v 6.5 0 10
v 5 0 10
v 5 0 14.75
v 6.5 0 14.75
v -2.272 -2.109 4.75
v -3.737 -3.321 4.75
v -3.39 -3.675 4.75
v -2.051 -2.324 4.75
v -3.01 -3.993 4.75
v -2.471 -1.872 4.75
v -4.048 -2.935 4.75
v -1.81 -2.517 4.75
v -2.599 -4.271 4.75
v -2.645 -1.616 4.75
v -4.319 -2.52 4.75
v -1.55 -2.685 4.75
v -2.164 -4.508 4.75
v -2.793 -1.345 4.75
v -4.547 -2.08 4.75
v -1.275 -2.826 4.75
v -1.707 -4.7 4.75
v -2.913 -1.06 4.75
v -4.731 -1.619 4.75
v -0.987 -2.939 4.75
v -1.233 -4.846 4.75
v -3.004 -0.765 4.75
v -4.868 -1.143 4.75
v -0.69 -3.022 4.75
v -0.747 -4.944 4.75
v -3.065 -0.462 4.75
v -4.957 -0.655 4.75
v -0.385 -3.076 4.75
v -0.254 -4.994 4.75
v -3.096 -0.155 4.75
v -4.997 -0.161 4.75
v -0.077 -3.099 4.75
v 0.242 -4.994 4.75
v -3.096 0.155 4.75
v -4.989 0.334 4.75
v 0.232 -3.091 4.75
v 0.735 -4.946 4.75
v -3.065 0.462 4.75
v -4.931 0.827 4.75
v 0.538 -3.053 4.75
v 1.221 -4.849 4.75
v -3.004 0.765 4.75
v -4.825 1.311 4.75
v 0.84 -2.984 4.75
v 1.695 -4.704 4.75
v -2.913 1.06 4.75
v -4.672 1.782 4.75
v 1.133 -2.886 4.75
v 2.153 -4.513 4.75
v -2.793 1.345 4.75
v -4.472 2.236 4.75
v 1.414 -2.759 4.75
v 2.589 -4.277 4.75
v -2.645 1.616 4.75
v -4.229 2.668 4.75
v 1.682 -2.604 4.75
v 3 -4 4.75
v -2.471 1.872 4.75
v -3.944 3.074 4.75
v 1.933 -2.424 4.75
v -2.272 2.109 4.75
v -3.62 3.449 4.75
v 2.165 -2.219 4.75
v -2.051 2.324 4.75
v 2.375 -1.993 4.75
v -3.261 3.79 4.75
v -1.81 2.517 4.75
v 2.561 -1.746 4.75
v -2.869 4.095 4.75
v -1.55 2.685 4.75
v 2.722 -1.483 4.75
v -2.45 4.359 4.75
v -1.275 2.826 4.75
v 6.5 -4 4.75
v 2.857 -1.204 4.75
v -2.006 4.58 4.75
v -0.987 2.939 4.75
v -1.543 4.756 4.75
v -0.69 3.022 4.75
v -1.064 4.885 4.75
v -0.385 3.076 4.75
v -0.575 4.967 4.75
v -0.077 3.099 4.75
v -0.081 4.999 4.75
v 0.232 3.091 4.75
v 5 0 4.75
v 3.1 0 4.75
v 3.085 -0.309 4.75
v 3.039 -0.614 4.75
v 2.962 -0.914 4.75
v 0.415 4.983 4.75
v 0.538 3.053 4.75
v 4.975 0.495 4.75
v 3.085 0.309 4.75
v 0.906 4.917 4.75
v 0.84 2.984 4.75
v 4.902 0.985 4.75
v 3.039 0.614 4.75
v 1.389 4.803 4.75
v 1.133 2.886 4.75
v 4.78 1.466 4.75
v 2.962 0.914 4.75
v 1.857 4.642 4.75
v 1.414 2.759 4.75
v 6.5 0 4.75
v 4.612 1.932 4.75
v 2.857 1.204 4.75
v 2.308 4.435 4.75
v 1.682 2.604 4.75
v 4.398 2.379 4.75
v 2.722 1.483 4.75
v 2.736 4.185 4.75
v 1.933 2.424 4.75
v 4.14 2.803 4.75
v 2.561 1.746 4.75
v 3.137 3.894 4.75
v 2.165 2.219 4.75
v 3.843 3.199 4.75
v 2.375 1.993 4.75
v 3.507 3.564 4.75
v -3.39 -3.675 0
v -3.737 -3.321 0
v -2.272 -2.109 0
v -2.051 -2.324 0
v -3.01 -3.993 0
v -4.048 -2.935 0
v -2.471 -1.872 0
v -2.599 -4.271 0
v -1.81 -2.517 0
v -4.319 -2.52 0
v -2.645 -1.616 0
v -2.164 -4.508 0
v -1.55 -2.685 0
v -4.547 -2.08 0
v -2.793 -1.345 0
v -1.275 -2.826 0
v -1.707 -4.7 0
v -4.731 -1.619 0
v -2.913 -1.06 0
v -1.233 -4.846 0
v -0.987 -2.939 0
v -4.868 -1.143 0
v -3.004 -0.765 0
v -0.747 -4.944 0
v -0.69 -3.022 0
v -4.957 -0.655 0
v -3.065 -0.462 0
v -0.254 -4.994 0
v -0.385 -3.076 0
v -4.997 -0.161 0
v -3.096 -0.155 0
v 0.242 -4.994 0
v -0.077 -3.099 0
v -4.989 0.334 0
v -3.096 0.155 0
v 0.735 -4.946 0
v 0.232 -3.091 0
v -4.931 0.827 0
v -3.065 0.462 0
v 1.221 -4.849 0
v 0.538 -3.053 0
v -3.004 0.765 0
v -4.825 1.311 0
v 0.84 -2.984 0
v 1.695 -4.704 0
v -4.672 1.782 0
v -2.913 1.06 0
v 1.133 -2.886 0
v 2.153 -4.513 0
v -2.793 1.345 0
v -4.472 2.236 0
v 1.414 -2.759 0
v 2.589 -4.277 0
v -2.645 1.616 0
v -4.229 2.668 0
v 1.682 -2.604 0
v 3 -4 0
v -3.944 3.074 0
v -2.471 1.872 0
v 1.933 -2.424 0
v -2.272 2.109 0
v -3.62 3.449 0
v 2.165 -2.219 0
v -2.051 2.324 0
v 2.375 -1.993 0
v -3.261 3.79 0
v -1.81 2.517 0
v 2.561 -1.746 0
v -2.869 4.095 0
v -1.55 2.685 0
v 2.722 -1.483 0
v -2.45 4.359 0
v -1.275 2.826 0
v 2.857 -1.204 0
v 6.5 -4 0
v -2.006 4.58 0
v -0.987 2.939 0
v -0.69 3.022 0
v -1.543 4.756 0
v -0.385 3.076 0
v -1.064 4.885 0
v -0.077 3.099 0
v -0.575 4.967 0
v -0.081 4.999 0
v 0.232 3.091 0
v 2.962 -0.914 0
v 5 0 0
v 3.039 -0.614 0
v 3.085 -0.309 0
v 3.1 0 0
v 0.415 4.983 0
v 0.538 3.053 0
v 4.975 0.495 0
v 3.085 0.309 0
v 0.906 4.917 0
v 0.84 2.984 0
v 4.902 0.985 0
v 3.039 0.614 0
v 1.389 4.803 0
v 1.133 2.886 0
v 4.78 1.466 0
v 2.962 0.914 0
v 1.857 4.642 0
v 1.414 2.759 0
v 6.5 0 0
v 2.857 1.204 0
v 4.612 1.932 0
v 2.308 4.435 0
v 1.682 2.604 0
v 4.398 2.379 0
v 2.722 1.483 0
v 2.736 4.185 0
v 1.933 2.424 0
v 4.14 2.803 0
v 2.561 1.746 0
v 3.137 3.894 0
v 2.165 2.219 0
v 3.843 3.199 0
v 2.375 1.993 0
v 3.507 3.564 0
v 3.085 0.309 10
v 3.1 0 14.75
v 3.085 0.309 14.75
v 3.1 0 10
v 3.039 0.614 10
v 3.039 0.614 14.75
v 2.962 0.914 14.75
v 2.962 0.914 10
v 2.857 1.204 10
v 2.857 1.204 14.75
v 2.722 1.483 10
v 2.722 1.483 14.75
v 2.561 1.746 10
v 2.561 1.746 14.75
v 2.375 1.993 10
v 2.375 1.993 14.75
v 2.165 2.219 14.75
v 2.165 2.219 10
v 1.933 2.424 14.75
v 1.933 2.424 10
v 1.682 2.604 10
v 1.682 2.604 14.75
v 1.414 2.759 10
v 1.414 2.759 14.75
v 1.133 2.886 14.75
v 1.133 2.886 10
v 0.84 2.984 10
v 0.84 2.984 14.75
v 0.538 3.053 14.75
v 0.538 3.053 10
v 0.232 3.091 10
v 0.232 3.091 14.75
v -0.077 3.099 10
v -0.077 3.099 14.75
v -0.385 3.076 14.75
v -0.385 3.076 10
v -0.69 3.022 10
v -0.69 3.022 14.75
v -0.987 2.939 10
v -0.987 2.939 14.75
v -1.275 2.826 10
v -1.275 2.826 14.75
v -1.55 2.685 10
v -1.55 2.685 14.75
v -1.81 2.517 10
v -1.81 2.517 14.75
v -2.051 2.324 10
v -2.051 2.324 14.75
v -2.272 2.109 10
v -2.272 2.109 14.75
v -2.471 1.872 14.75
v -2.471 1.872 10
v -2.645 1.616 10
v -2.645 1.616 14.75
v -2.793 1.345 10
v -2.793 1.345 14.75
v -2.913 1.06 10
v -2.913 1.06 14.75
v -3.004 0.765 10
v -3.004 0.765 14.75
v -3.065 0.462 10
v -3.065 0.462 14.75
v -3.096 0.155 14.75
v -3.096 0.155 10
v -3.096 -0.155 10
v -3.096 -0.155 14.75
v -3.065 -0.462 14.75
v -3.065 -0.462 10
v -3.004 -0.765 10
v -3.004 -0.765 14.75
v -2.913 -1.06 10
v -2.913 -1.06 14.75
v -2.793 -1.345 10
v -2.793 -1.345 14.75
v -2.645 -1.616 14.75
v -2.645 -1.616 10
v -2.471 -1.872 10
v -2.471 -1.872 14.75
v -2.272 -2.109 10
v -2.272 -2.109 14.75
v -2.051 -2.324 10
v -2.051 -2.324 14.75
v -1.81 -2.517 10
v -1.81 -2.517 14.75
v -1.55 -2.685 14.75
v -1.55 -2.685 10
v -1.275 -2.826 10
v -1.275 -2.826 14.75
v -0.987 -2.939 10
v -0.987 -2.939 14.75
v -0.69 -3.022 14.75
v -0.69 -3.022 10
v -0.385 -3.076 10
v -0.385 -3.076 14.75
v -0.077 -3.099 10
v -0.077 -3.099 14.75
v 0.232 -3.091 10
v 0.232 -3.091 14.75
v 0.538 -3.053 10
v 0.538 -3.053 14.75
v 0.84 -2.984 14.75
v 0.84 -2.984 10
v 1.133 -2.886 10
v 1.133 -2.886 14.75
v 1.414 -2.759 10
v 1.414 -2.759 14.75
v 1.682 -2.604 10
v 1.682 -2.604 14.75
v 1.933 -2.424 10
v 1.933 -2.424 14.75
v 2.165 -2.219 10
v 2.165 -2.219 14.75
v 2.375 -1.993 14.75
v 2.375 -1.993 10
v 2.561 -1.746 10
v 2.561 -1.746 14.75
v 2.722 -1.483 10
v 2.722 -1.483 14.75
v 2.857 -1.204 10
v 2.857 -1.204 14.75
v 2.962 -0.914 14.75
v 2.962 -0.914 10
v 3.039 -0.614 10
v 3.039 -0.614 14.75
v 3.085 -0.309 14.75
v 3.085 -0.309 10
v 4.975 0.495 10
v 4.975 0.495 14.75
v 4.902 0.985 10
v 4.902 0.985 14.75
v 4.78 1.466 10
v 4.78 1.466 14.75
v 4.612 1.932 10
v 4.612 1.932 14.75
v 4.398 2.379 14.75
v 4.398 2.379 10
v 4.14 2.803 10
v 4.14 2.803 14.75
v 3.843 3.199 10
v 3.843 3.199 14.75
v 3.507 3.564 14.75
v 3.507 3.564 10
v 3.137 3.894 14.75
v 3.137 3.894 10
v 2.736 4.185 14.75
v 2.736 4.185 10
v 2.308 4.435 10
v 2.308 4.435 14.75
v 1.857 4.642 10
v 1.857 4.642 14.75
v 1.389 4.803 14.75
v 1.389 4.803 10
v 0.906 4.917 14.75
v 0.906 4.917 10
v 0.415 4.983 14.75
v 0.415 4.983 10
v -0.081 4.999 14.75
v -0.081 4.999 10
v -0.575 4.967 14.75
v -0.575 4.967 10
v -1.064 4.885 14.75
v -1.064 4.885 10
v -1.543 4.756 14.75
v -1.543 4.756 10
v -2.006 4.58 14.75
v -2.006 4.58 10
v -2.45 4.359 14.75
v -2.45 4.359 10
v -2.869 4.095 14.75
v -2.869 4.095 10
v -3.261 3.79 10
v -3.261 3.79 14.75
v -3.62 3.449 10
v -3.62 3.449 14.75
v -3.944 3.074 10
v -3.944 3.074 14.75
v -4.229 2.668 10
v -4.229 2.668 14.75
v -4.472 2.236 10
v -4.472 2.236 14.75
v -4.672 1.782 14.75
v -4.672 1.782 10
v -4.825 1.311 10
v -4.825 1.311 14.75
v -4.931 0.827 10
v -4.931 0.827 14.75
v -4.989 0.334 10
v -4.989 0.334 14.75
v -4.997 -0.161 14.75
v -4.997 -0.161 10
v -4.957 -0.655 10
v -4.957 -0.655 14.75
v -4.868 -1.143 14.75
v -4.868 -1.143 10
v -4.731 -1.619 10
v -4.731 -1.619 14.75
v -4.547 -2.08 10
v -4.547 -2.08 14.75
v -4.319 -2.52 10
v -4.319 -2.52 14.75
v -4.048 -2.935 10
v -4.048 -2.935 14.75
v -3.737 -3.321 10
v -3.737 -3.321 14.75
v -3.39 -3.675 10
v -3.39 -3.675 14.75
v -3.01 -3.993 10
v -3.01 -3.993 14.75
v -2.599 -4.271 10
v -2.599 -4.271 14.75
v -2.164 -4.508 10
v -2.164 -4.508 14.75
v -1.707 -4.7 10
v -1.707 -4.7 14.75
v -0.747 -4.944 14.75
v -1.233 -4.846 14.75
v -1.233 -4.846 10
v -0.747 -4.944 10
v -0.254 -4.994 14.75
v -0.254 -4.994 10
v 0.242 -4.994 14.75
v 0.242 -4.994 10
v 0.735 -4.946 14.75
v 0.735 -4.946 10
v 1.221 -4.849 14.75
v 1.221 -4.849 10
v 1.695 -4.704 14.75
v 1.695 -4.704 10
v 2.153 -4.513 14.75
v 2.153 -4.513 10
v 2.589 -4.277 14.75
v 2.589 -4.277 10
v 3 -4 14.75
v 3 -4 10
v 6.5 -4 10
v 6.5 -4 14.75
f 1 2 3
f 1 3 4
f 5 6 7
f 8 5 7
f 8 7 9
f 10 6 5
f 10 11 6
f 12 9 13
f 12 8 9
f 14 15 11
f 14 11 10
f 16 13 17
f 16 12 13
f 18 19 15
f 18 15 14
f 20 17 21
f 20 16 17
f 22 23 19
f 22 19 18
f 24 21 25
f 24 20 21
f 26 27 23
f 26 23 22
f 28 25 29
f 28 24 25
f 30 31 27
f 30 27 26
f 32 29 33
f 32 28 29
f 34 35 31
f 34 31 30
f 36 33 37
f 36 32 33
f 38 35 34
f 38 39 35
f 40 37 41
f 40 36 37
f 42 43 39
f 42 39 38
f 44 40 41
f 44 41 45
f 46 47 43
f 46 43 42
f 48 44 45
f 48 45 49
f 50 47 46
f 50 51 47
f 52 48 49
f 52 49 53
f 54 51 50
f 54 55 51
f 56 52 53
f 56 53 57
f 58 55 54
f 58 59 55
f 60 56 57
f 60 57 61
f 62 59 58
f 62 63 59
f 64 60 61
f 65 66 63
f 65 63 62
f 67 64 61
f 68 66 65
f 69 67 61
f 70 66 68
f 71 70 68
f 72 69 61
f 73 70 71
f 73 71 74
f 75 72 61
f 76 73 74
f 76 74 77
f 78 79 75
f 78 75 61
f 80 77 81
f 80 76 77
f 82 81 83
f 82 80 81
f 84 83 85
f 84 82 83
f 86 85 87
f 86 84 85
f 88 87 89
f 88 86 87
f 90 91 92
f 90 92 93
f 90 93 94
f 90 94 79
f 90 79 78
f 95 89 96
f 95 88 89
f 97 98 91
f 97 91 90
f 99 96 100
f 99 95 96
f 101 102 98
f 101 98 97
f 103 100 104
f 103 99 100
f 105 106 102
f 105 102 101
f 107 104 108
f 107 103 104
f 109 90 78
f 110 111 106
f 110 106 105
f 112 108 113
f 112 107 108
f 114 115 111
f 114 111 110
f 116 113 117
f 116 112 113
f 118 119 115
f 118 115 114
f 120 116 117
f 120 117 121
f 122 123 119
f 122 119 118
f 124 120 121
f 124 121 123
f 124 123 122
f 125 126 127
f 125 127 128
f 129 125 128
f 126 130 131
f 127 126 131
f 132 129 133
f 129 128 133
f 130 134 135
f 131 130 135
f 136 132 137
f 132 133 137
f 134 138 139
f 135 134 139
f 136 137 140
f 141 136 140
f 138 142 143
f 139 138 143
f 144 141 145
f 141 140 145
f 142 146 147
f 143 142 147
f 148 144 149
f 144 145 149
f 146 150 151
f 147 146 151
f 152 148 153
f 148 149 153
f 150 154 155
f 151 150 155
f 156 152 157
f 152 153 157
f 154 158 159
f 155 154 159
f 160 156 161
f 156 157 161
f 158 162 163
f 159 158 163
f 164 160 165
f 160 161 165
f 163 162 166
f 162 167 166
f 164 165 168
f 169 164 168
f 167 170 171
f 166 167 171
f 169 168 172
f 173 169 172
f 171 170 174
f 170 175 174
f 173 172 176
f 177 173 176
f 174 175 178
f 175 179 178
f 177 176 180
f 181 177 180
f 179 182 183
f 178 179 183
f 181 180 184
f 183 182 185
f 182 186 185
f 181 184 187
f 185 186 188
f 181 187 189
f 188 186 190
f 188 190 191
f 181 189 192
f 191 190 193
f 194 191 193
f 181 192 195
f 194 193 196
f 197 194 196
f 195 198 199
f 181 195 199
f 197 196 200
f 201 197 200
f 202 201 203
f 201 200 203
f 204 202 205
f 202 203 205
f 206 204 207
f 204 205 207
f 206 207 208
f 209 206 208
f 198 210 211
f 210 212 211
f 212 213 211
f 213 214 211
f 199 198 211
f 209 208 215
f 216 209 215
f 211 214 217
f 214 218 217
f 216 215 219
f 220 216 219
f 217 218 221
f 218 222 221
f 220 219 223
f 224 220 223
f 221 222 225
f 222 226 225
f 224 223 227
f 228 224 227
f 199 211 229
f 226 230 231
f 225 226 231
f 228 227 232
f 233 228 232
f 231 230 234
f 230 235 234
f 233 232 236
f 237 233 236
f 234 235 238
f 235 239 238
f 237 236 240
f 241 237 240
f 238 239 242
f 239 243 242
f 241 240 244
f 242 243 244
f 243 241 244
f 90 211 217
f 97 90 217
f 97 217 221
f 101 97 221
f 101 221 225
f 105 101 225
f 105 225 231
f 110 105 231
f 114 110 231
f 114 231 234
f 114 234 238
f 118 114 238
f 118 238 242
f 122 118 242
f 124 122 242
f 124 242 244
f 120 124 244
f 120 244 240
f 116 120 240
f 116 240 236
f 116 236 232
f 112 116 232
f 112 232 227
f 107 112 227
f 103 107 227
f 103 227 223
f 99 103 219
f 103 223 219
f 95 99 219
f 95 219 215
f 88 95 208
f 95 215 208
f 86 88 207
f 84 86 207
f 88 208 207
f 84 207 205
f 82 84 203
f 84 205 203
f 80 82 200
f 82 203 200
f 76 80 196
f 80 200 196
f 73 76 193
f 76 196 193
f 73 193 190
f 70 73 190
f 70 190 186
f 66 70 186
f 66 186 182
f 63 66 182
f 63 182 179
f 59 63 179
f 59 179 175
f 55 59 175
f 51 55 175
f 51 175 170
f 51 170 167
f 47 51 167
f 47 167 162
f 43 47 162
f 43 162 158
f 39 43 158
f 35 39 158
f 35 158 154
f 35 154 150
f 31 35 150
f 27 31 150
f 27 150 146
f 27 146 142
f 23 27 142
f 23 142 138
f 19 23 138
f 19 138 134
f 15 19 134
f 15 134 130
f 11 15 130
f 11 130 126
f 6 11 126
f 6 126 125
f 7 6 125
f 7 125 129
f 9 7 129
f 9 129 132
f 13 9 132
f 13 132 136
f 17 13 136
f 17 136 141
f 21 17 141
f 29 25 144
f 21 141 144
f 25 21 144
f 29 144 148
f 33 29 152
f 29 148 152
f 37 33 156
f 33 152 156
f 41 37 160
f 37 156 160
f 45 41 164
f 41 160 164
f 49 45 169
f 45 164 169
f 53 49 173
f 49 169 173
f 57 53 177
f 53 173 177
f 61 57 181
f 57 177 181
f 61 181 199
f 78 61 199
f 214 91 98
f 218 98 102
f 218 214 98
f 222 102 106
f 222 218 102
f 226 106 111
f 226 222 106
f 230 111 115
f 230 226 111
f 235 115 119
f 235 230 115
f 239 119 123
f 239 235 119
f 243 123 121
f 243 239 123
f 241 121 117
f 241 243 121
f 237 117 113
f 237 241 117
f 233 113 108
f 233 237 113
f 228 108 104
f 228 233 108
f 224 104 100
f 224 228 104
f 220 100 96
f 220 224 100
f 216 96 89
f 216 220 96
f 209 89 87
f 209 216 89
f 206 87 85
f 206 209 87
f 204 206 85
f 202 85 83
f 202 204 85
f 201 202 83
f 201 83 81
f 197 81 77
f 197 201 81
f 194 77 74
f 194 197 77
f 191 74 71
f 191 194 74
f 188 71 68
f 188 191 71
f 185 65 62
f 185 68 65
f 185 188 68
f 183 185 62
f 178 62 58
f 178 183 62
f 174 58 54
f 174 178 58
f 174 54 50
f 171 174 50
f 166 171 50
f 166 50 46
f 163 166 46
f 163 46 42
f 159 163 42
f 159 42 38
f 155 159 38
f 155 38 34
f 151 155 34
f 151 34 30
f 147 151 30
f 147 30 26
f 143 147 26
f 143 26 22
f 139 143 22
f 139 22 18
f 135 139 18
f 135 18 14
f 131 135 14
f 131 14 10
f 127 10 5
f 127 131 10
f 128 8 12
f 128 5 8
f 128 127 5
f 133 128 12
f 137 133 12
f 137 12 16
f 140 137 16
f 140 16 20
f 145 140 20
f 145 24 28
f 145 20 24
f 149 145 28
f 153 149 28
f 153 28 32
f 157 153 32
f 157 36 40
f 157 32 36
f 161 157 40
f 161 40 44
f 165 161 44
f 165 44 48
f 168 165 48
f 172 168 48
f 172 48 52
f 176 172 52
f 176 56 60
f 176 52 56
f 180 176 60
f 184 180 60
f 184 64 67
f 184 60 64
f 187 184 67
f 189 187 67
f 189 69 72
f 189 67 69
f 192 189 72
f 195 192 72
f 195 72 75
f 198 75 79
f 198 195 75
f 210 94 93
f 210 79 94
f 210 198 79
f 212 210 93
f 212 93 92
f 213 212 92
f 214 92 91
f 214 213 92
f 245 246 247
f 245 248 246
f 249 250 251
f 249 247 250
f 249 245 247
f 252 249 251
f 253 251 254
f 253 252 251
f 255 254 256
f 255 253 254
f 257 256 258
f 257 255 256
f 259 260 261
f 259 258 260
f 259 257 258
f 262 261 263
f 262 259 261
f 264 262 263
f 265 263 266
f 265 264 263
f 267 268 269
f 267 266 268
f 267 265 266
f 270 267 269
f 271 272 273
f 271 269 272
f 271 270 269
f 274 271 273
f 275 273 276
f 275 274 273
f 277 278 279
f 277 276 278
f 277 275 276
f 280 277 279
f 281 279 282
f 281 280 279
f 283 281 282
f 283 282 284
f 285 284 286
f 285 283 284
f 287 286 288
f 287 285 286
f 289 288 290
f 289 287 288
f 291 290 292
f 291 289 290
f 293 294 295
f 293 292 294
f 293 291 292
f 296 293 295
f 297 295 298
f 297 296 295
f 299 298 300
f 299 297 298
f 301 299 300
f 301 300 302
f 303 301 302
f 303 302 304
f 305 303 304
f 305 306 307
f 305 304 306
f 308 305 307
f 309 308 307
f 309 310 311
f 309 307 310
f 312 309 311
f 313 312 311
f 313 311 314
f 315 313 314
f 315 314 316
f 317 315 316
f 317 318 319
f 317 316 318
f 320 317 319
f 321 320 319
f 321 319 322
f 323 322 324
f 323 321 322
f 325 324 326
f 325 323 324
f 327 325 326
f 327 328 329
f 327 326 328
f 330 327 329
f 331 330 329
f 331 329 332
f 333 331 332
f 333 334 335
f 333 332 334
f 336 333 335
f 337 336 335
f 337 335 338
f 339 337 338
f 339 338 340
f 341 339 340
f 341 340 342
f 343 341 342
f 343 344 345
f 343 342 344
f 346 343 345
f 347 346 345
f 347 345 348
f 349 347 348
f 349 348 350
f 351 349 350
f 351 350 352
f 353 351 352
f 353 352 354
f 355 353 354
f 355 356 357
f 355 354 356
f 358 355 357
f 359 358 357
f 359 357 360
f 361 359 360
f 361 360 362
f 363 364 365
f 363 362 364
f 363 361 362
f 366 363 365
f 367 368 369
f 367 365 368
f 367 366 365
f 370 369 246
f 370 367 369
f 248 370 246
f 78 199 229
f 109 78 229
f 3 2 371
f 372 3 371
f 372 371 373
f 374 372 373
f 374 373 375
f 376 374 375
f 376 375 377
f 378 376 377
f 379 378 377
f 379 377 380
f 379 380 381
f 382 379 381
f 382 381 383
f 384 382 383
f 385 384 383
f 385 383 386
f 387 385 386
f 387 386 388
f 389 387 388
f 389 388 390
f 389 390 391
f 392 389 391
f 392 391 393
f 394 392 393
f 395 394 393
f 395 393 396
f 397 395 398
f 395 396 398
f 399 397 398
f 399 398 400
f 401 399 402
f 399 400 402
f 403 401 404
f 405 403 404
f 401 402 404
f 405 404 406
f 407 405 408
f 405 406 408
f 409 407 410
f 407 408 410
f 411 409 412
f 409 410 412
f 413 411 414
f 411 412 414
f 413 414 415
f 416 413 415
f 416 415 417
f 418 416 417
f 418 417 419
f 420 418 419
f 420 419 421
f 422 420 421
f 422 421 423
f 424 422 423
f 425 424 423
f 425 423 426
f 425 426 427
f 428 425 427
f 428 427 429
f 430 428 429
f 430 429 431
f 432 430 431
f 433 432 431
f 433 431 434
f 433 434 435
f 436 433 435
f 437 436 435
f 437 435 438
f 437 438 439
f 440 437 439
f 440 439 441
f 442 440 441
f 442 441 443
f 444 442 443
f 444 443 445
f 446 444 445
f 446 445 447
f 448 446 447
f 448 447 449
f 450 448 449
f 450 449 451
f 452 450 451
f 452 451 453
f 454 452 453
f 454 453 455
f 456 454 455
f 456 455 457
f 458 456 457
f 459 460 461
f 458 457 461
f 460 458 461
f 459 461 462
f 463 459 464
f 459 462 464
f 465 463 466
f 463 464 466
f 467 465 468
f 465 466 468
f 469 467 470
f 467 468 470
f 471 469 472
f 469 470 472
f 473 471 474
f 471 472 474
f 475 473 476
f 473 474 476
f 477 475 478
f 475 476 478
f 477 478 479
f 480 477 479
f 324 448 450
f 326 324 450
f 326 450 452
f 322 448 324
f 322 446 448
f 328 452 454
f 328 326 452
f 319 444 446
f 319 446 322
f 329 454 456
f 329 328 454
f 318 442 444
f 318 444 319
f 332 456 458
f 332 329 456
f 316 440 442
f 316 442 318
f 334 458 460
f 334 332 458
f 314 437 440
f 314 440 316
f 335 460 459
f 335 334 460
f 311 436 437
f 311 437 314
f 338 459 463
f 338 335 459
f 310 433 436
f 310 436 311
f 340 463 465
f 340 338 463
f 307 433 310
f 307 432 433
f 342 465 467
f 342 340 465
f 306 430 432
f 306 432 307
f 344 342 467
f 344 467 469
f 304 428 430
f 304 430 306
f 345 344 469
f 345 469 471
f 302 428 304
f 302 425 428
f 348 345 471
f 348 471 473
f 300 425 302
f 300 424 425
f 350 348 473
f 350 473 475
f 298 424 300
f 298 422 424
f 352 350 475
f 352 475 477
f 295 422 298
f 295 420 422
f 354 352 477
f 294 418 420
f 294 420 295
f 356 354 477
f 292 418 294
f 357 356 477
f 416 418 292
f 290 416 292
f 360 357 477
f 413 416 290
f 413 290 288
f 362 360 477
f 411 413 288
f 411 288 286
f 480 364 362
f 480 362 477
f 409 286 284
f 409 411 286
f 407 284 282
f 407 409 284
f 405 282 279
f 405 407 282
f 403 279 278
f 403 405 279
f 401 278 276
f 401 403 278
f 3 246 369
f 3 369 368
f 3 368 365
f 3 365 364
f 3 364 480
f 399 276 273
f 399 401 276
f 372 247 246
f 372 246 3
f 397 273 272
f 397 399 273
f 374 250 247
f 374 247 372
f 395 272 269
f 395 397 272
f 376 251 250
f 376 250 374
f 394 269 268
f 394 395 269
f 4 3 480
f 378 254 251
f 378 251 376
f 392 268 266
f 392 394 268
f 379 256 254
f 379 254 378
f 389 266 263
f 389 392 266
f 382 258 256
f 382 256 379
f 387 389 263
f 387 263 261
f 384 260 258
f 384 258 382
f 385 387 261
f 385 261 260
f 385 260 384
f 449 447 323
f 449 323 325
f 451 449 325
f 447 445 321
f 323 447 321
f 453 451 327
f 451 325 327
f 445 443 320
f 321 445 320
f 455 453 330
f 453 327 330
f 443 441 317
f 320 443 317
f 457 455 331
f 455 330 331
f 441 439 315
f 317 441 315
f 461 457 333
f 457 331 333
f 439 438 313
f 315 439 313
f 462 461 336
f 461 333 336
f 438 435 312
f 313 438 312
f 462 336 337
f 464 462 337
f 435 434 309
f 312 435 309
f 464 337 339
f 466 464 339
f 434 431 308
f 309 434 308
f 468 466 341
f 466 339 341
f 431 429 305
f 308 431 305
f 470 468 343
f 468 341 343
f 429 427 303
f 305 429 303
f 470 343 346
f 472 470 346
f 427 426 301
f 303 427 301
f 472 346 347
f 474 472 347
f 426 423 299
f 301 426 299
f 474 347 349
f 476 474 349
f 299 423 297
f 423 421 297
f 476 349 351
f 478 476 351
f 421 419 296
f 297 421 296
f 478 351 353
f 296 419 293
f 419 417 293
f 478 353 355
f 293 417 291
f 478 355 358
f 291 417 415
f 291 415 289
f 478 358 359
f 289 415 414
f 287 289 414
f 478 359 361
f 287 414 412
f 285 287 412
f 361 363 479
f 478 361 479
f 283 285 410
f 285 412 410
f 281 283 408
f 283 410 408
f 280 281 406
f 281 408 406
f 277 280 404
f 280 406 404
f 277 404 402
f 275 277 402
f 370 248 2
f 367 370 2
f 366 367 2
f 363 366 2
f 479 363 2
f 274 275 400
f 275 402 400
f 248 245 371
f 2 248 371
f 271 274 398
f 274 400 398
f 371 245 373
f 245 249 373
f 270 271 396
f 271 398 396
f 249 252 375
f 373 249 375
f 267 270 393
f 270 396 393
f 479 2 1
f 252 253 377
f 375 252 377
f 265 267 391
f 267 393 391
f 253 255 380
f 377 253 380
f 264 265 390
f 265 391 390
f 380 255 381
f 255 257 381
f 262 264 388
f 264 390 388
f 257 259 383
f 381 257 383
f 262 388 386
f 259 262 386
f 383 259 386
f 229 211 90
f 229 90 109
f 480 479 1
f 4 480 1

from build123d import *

# Parameters (mm, degrees)
CYLINDER010_R     = 3.1
CYLINDER010_DEPTH = 20
CYLINDER002_R     = 5
CYLINDER002_DEPTH = 4.75
BOX002_W          = 3.5
BOX002_H          = 4
BOX002_DEPTH      = 4.75
BOX004_W          = 3.5
BOX004_H          = 4
BOX004_DEPTH      = 4.75
CYLINDER_R        = 5
CYLINDER_DEPTH    = 4.75


with BuildPart() as cylinder010:
    # Cylinder010 → Cylinder010 (new body)
    with BuildSketch(Plane.XY):
        Circle(CYLINDER010_R)
    extrude(amount=CYLINDER010_DEPTH)


with BuildPart() as cylinder002:
    # Cylinder002 → Cylinder002 (new body)
    with BuildSketch(Plane.XY.offset(10)):
        Circle(CYLINDER002_R)
    extrude(amount=CYLINDER002_DEPTH)


with BuildPart() as cube002:
    # Box002 → Box002 (new body)
    with BuildSketch(Plane(origin=(3, -4, 0), x_dir=(1, 0, 0), z_dir=(0, 0, 1))):
        with Locations((1.75, 2)):
            Rectangle(BOX002_W, BOX002_H)
    extrude(amount=BOX002_DEPTH)


with BuildPart() as cube004:
    # Box004 → Box004 (new body)
    with BuildSketch(Plane(origin=(3, -4, 10), x_dir=(1, 0, 0), z_dir=(0, 0, 1))):
        with Locations((1.75, 2)):
            Rectangle(BOX004_W, BOX004_H)
    extrude(amount=BOX004_DEPTH)


with BuildPart() as hinge_unthreaded:
    # Cylinder → Cylinder (new body)
    with BuildSketch(Plane.XY):
        Circle(CYLINDER_R)
    extrude(amount=CYLINDER_DEPTH)

    # Connect004: union Cylinder002, Cube002, Cube004
    add(cylinder002.part)
    add(cube002.part)
    add(cube004.part)

    # Cut001: cut Cylinder010
    add(cylinder010.part, mode=Mode.SUBTRACT)


solid = hinge_unthreaded.part
